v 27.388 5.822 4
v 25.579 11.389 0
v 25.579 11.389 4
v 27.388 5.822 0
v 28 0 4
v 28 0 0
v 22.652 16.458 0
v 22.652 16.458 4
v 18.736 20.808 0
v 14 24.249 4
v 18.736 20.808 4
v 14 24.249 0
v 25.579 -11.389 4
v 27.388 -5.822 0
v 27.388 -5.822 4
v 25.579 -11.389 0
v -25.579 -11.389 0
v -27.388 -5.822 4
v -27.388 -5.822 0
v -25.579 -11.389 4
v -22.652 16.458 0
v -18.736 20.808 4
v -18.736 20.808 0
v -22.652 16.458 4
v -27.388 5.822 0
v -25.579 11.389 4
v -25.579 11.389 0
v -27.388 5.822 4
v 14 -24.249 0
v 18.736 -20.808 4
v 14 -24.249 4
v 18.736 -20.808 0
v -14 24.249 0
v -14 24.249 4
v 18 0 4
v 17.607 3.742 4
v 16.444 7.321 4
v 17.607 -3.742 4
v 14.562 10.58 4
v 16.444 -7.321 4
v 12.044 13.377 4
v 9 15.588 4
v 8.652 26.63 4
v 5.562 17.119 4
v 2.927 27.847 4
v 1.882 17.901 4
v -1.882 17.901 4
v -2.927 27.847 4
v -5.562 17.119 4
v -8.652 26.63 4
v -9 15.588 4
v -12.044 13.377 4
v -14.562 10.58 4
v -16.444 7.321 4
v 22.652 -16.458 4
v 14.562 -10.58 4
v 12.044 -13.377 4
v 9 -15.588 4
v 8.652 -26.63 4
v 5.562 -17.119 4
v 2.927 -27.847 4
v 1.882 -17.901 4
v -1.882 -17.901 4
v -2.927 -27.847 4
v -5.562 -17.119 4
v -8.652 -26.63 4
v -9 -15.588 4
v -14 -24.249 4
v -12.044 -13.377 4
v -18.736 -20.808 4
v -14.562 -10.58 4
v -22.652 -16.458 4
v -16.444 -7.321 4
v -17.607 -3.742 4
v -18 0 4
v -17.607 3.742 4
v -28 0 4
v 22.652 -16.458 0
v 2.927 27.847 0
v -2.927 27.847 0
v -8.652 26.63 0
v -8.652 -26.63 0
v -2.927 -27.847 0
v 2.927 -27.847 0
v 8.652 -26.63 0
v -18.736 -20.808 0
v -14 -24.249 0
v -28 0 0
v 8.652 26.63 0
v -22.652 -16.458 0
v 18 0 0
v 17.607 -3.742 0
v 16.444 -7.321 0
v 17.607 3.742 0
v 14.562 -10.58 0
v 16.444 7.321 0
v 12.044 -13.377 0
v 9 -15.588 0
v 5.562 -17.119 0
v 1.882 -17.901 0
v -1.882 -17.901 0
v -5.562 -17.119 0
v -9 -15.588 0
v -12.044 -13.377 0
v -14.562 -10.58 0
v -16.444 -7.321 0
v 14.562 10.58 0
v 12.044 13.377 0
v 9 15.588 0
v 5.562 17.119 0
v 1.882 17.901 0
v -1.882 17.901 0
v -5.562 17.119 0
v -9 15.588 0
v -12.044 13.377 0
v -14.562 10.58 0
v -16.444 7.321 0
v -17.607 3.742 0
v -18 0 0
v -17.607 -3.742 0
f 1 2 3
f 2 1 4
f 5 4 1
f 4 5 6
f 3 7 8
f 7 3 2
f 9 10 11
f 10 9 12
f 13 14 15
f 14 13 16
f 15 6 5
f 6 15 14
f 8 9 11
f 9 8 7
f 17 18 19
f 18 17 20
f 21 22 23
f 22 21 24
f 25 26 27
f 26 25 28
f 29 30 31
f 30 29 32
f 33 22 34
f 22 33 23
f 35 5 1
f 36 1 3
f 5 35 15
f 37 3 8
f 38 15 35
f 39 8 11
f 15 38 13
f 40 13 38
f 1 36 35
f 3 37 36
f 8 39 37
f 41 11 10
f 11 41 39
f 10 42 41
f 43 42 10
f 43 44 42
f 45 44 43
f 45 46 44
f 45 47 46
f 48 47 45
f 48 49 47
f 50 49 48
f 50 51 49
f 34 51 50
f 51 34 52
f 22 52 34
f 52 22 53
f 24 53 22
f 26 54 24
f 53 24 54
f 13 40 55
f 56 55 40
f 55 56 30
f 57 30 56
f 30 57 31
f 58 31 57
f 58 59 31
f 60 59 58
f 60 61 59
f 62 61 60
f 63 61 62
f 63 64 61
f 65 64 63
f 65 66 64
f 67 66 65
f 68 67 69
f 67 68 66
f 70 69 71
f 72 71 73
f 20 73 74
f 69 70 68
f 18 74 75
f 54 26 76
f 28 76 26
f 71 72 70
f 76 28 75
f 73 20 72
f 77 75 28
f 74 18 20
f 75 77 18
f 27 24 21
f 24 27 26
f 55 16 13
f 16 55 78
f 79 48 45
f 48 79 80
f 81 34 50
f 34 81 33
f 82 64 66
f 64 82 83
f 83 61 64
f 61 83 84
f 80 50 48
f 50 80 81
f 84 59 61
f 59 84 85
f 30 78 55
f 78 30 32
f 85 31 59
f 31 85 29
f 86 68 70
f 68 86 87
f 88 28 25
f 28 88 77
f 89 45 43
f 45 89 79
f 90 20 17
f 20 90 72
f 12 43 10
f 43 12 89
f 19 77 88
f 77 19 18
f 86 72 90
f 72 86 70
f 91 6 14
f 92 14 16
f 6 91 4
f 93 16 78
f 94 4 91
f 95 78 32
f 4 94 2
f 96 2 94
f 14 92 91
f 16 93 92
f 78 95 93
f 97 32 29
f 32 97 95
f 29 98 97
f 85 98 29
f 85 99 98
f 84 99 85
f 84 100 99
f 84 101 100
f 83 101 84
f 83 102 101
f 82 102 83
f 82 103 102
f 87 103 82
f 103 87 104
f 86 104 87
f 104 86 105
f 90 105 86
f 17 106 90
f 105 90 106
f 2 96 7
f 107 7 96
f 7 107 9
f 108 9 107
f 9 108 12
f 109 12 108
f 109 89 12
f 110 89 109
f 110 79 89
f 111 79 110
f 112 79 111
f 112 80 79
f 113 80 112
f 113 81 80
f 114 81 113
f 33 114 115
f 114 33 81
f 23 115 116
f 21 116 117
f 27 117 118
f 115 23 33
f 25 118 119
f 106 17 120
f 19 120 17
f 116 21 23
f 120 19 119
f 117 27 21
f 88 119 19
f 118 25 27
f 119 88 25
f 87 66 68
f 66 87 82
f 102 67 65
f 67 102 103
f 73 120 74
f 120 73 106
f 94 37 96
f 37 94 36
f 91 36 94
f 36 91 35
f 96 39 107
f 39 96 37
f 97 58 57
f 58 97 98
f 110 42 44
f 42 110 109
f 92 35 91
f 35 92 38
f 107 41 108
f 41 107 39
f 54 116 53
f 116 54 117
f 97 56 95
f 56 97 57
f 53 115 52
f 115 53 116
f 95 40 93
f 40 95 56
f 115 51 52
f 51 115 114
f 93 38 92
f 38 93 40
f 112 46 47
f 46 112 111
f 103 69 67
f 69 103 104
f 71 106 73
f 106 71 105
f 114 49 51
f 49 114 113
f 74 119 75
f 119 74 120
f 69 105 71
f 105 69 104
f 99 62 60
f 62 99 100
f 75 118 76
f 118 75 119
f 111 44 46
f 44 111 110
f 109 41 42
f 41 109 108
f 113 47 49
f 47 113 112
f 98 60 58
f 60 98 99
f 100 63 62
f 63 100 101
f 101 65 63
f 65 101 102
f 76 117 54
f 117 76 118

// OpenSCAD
difference() {
	cylinder(r=56/2, h=4);
	translate([0,0,-1]) cylinder(r=36/2, h=6);
}
